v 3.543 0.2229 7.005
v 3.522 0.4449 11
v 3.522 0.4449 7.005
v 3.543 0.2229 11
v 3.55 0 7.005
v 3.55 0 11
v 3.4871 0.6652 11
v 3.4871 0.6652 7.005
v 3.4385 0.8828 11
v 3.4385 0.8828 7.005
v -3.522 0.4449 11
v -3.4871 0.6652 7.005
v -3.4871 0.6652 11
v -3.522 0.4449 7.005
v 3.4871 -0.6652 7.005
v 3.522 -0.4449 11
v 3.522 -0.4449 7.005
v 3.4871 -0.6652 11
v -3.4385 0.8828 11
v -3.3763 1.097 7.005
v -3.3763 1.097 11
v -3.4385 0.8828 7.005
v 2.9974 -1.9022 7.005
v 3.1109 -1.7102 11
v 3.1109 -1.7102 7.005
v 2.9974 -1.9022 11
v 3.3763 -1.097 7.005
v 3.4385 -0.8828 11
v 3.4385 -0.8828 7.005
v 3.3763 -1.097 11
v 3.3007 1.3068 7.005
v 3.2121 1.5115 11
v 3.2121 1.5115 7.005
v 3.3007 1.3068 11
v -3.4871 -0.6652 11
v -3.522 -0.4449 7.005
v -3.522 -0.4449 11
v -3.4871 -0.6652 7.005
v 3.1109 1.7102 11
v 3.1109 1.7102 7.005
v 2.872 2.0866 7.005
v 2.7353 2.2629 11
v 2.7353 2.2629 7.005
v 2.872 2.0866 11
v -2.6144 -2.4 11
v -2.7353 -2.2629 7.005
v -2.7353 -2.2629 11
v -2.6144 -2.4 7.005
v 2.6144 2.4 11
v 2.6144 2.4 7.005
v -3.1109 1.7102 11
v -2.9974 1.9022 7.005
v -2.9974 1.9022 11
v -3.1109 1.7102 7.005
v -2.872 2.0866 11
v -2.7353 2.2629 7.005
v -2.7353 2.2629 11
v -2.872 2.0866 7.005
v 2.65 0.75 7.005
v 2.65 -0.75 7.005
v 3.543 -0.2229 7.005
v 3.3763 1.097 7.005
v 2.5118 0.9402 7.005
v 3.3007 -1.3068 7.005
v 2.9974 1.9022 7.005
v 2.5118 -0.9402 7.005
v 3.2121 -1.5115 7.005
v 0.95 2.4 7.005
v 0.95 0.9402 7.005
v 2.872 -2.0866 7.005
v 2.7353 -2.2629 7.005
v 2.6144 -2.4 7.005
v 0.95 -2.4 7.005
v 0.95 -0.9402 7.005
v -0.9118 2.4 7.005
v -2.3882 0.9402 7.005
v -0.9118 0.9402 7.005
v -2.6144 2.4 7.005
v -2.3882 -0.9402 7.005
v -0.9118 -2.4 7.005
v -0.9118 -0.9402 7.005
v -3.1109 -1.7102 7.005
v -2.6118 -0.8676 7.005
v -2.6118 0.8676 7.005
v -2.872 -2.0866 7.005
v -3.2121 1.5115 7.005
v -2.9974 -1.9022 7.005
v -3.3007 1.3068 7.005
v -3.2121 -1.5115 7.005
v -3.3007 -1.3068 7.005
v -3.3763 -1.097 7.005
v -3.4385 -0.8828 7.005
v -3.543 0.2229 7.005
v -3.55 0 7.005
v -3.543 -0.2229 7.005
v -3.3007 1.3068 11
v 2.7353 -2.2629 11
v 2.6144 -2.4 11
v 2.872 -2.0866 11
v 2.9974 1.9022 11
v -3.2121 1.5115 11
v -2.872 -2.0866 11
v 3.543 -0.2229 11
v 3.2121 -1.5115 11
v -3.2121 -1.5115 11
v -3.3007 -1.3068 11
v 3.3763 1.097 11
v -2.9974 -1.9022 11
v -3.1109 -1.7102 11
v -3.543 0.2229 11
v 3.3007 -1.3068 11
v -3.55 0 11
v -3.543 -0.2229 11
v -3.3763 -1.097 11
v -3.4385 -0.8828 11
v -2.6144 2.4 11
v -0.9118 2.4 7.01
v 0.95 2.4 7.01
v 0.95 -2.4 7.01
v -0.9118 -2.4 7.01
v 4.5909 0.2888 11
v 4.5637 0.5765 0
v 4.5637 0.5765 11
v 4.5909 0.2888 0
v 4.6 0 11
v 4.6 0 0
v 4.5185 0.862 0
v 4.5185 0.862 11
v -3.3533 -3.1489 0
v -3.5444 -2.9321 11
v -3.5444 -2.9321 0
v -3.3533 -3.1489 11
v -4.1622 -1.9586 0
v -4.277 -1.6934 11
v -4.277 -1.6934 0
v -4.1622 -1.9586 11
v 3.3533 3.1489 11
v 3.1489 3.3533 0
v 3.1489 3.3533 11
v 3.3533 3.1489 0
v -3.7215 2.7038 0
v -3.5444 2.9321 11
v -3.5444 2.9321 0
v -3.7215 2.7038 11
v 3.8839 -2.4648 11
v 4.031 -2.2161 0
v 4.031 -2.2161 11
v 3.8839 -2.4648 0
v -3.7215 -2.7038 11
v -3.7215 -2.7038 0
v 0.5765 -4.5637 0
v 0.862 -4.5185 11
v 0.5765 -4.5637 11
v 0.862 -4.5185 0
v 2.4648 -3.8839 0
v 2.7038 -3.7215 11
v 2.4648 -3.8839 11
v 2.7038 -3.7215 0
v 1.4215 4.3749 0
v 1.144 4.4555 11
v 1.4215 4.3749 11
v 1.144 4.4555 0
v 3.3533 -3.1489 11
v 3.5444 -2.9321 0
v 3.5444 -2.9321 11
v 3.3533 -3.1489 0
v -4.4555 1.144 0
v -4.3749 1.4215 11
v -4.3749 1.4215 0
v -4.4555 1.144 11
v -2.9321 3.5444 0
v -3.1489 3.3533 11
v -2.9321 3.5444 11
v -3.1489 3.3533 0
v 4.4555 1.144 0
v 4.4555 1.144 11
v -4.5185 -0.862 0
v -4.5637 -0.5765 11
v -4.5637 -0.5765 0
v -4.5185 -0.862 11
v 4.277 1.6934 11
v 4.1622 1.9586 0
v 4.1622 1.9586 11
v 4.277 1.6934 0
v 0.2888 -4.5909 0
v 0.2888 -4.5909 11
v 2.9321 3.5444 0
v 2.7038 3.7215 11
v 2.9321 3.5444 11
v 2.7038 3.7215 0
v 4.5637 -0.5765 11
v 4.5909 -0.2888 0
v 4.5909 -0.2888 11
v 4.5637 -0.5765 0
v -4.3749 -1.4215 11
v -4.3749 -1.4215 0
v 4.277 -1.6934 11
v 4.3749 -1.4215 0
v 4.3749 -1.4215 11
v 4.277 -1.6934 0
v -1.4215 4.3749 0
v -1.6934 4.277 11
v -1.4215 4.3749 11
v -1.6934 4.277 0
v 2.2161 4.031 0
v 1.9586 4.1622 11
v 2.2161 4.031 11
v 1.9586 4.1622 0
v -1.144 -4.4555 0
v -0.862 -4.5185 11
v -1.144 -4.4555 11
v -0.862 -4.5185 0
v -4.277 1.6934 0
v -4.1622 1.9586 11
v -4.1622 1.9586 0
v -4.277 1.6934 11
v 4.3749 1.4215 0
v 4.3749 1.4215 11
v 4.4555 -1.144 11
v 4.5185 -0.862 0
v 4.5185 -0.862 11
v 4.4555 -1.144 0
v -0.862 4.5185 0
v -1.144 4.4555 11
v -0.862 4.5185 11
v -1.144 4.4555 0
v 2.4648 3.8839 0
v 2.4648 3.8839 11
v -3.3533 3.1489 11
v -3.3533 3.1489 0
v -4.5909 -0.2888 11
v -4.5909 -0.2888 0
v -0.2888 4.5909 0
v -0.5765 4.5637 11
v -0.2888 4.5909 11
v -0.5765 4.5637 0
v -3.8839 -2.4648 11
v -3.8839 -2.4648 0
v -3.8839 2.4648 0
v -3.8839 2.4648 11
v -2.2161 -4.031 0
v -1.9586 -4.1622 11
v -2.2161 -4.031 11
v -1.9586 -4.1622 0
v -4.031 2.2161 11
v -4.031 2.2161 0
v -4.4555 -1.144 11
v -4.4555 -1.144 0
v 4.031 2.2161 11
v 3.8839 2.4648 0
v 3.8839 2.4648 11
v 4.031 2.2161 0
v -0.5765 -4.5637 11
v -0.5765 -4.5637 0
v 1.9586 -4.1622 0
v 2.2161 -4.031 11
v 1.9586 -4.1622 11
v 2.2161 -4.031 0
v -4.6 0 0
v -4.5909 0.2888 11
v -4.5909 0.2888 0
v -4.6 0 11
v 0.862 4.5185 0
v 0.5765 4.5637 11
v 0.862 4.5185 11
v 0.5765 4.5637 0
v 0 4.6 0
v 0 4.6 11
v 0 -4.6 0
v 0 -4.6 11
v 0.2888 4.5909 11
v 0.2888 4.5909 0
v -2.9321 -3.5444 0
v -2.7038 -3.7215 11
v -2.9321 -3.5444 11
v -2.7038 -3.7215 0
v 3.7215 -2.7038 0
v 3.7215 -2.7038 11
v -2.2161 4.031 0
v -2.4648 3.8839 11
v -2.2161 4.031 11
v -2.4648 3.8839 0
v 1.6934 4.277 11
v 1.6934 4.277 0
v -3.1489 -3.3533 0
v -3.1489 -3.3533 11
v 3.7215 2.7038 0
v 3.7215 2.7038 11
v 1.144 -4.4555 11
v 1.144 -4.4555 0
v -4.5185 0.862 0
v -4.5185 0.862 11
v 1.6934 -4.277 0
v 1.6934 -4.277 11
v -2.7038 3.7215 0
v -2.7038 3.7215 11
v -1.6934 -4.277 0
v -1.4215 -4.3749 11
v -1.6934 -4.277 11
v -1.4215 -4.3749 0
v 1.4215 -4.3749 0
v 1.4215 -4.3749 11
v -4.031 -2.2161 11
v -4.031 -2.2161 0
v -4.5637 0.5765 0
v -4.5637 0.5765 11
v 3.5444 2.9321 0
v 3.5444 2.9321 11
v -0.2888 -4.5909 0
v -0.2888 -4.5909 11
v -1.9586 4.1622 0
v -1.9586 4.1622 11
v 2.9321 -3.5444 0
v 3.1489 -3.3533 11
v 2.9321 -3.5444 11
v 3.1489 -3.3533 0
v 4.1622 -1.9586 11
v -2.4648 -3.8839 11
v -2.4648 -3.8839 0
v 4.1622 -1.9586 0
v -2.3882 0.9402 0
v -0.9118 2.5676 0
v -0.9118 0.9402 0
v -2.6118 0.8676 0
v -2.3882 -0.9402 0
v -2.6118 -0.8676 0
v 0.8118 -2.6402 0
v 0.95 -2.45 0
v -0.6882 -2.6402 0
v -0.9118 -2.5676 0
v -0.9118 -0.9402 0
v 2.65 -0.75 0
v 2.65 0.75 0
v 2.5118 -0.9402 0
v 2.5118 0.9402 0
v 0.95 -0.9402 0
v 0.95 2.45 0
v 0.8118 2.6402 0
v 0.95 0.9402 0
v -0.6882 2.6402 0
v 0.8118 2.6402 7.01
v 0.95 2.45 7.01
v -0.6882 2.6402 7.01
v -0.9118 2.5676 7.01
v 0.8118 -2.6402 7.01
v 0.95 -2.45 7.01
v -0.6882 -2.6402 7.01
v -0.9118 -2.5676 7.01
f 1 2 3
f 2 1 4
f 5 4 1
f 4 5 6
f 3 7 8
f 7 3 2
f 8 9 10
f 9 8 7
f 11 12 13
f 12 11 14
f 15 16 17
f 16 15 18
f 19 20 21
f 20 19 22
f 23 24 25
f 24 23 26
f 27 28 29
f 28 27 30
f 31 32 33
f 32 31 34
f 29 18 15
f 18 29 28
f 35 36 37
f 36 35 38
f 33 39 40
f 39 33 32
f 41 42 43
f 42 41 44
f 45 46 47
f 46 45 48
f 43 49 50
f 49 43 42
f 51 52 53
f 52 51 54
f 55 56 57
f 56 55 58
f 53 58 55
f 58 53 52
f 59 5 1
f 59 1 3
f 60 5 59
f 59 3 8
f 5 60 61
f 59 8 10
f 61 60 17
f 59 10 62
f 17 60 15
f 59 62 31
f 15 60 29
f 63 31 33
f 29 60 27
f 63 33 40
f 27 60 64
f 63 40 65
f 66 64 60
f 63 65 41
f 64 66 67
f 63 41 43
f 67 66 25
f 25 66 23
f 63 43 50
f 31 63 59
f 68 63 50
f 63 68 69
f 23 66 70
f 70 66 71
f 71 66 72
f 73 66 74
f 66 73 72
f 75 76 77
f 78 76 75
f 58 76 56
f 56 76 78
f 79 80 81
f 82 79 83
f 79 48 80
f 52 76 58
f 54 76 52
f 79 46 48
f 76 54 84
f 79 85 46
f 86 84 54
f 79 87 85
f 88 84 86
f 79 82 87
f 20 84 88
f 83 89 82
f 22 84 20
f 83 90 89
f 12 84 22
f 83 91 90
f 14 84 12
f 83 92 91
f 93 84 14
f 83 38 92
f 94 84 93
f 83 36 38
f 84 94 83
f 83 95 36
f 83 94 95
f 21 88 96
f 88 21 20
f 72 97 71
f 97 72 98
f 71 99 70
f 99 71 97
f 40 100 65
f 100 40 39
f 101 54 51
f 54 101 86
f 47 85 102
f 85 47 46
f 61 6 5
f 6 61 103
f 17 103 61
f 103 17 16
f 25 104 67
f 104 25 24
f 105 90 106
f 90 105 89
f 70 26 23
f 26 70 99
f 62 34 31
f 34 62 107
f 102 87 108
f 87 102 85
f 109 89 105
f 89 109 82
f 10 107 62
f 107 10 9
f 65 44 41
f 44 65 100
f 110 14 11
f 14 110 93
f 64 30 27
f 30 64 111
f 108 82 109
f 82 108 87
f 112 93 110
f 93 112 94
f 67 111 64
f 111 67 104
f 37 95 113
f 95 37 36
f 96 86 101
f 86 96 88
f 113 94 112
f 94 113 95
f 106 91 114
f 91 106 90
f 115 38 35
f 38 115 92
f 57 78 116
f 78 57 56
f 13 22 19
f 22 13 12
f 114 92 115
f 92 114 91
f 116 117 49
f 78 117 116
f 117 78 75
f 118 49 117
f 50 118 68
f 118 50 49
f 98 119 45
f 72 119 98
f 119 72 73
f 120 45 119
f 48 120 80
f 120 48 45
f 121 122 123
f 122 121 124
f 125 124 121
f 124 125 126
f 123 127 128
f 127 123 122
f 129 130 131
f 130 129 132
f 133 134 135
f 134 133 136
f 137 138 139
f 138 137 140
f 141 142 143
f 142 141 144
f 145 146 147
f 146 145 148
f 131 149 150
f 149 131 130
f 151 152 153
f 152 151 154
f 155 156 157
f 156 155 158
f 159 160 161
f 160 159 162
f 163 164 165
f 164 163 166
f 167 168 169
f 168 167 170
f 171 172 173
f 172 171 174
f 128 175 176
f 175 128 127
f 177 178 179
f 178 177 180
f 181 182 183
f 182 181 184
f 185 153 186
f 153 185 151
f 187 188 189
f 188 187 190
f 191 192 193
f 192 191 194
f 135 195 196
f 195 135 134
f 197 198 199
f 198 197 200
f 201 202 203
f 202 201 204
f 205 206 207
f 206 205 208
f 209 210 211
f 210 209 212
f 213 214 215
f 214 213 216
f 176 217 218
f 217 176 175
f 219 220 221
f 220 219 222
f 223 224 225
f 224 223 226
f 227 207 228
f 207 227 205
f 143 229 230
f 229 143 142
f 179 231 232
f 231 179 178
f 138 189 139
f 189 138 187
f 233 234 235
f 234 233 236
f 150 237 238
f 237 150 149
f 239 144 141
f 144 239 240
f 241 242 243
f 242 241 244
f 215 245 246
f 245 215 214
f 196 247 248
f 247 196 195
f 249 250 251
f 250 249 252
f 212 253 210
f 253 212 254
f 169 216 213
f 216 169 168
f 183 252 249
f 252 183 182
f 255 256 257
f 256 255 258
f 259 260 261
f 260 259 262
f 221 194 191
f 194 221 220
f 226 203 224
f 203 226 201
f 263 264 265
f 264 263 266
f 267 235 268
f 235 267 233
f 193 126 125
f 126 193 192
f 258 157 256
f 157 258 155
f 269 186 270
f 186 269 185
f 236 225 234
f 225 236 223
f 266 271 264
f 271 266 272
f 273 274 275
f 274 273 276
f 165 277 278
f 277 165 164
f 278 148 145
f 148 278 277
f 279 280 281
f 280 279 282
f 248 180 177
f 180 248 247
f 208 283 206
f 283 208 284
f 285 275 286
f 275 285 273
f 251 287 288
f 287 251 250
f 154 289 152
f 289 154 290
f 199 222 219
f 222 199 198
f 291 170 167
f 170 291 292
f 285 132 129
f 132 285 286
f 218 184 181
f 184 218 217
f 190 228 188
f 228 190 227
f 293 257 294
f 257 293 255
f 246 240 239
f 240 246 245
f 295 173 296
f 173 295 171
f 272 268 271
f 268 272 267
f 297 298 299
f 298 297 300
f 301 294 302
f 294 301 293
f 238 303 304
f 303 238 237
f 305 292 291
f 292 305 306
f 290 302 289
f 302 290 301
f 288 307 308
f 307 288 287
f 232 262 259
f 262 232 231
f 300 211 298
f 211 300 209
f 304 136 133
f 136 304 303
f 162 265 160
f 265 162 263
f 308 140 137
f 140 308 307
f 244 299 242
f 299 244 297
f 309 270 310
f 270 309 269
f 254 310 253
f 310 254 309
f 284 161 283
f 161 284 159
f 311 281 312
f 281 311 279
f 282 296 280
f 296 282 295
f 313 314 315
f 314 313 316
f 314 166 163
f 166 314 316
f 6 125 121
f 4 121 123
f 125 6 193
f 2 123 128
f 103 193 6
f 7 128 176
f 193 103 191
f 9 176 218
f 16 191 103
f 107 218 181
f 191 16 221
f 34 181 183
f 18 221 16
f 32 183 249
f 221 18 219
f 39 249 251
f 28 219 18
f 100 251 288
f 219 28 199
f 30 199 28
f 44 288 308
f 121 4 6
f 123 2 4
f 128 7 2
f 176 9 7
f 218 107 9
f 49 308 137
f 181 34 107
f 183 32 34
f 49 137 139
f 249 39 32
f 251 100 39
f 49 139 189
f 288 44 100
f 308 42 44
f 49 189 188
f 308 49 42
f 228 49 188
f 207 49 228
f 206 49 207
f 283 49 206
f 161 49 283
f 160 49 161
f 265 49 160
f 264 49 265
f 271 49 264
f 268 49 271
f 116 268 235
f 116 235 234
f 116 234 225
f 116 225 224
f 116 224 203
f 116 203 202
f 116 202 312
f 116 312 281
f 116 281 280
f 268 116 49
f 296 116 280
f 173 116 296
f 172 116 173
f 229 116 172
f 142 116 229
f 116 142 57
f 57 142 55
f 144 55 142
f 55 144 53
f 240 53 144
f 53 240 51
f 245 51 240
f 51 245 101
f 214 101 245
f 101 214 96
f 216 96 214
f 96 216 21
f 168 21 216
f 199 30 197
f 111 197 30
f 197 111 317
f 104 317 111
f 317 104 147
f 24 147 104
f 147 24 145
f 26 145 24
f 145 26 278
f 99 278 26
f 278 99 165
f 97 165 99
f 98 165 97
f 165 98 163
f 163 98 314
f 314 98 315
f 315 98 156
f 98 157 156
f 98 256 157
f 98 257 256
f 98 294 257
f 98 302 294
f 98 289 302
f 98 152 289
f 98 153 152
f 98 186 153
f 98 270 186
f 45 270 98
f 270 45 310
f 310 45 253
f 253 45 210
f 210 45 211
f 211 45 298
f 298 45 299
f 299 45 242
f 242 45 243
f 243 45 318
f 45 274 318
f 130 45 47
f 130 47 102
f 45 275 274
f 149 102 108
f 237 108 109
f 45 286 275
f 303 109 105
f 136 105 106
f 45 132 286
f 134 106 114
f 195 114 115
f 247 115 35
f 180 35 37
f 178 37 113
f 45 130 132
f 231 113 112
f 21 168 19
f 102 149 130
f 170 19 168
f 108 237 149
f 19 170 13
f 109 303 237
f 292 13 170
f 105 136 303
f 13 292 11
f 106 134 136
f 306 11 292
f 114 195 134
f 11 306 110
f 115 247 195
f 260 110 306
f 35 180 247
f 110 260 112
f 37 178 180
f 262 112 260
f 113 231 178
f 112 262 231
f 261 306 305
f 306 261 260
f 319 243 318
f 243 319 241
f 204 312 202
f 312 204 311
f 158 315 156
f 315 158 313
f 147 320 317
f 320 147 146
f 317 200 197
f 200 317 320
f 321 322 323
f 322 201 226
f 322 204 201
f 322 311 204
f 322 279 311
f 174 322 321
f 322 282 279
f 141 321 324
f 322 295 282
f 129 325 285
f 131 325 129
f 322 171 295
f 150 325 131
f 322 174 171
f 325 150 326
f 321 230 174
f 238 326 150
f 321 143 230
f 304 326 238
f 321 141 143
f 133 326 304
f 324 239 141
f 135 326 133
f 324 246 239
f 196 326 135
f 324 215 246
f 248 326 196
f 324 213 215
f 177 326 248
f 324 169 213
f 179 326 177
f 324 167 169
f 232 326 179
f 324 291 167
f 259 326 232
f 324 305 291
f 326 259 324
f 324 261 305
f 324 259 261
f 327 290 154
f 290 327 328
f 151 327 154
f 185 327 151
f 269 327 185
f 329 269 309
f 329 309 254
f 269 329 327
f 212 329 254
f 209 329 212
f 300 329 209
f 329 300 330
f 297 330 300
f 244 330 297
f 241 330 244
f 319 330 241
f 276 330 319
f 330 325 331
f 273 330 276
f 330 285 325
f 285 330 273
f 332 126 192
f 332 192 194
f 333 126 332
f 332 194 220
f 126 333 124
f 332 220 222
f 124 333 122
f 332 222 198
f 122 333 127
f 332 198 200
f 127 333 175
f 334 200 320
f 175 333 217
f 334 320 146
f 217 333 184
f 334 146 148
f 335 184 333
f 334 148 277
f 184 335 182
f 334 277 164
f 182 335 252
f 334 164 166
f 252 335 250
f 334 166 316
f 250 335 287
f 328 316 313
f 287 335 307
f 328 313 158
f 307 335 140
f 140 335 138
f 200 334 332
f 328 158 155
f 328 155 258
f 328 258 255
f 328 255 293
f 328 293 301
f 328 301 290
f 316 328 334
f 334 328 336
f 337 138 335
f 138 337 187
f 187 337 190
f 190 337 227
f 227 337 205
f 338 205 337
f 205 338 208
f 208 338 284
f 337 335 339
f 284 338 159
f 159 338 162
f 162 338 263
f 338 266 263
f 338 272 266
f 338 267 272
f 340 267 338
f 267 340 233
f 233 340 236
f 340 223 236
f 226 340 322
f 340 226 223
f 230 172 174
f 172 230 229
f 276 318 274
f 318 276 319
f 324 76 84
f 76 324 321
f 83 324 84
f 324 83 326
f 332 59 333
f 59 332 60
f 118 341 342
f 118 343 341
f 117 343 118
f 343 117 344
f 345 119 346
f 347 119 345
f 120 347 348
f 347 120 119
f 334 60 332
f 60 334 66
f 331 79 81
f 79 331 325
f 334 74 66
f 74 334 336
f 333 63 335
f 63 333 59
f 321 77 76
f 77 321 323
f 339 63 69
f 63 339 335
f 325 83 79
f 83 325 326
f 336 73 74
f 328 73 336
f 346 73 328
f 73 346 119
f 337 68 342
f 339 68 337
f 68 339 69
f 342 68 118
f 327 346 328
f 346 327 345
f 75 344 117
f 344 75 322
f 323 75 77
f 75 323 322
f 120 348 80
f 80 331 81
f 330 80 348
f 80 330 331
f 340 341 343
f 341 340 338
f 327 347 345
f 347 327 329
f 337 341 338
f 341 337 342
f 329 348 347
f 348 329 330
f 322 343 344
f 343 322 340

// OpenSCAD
// DC motor shaft to lego coupler
//
// Created by Moby Disk, 2015/02/08
// Thanks to mrob27 for thing 40410
// Changed by Drato to fit a Solarbotics GM8 Motor http://www.thingiverse.com/thing:1013155

// Diameters of various motor shafts:
// - Radio Shack 2730223: 2.0mm
// - Radio Shack 2730256: 2.3mm

// When 3D printing couplers, always try 0.1 - 0.3mm too big and test to see what actually fits

// Diameter of motor axle cutout, in mm, if motor axle is round without cutouts diameter is the same as motor_axle_diameter
motor_axle_cutout_diameter = 4.8;

// Diameter of motor axle, in mm
motor_axle_diameter = 7.1;

// Do you want to try some different axle sizes to see what fits best?
try_bigger_sizes = "no"; // [yes,no]

// Length of the axle part, in mm
axle_length = 7;
// Length of the motor axle part, in mm
motor_axle_length = 4;

// Outside radius of the coupler, in mm
coupler_outside_diameter = 9.2;

coupler_round_to_lego_axle(motor_axle_diameter,0, axle_length, motor_axle_length, coupler_outside_diameter);

spacing=coupler_outside_diameter*1.5;

if (try_bigger_sizes=="yes")
{
	for (bigger=[1:3])
	{
		translate([bigger*spacing,0,0])
		coupler_round_to_lego_axle(motor_axle_diameter,0.1*bigger, axle_length, motor_axle_length, coupler_outside_diameter);
	}
}

// Coupler for round DC motor shafts
// 
// diameter: diameter of the motor's axle
// fudge: Additional radius for the axle hole
//        - For 3D printing, the hole for the motor shaft must be larger than the actual axle itself
//        - 0.2mm and 0.3mm seem to work, but this may vary based on the printer and material
// length: A lego coupler is typically 15.9mm
// outside: outside diameter, increase for more strength
//
module coupler_round_to_lego_axle(diameter, fudge=0.2, axle_length=7, motor_axle_length=4, outside=7.2)
{
   // axle thickness is actually about 1.8 mm.  But for 3D printing, holes need to be bigger.
   axle_gap = 1.9;
   hole_radius = 2.65;

length = axle_length + motor_axle_length;
    
   motor_axle_diameter=diameter + fudge;
   difference()
   {
      // The coupler body
      translate([0,0,length/2])
      cylinder(r=outside/2,h=length,center=true,$fn=100);

      // The lego cross-axle hole
      translate([0 - hole_radius, 0 - axle_gap/2, -0.01])
      roundedRect([hole_radius * 2, axle_gap, axle_length+0.02], .2);
      translate([0 - axle_gap/2, 0 - hole_radius, -0.01])
      roundedRect([axle_gap, hole_radius * 2, axle_length+0.02], .2);

      difference()
      {
        // The hole for the motor shaft
        translate([0, 0, length-motor_axle_length/2+0.01])
        cylinder(r=motor_axle_diameter/2,h=motor_axle_length+0.01,center=true,$fn=100);
          
        translate([0,motor_axle_diameter/2+motor_axle_cutout_diameter/2, length-motor_axle_length/2+0.01])
        cube([motor_axle_diameter, motor_axle_diameter, motor_axle_length+0.01], true);
          
        translate([0,-motor_axle_diameter/2-motor_axle_cutout_diameter/2, length-motor_axle_length/2+0.01])
        cube([motor_axle_diameter, motor_axle_diameter, motor_axle_length+0.01], true);
      }
   }
}

// ---------------------------------------------------------------------------------
//
// module for rounded rectangles by tlrobinson on Thingiverse in a 
// comment posted to http://www.thingiverse.com/thing:9347 on March
// 29, 2012, 3:57:46 AM EDT
//
module roundedRect(size, radius) {  
  x = size[0];  
  y = size[1];  
  z = size[2];  
 
  linear_extrude(height=z)  
  hull() {  
    translate([radius, radius, 0])  
      circle(r=radius);  
 
    translate([x - radius, radius, 0])  
      circle(r=radius);  
 
    translate([x - radius, y - radius, 0])  
      circle(r=radius);  
 
    translate([radius, y - radius, 0])  
      circle(r=radius);  
  }  
}
